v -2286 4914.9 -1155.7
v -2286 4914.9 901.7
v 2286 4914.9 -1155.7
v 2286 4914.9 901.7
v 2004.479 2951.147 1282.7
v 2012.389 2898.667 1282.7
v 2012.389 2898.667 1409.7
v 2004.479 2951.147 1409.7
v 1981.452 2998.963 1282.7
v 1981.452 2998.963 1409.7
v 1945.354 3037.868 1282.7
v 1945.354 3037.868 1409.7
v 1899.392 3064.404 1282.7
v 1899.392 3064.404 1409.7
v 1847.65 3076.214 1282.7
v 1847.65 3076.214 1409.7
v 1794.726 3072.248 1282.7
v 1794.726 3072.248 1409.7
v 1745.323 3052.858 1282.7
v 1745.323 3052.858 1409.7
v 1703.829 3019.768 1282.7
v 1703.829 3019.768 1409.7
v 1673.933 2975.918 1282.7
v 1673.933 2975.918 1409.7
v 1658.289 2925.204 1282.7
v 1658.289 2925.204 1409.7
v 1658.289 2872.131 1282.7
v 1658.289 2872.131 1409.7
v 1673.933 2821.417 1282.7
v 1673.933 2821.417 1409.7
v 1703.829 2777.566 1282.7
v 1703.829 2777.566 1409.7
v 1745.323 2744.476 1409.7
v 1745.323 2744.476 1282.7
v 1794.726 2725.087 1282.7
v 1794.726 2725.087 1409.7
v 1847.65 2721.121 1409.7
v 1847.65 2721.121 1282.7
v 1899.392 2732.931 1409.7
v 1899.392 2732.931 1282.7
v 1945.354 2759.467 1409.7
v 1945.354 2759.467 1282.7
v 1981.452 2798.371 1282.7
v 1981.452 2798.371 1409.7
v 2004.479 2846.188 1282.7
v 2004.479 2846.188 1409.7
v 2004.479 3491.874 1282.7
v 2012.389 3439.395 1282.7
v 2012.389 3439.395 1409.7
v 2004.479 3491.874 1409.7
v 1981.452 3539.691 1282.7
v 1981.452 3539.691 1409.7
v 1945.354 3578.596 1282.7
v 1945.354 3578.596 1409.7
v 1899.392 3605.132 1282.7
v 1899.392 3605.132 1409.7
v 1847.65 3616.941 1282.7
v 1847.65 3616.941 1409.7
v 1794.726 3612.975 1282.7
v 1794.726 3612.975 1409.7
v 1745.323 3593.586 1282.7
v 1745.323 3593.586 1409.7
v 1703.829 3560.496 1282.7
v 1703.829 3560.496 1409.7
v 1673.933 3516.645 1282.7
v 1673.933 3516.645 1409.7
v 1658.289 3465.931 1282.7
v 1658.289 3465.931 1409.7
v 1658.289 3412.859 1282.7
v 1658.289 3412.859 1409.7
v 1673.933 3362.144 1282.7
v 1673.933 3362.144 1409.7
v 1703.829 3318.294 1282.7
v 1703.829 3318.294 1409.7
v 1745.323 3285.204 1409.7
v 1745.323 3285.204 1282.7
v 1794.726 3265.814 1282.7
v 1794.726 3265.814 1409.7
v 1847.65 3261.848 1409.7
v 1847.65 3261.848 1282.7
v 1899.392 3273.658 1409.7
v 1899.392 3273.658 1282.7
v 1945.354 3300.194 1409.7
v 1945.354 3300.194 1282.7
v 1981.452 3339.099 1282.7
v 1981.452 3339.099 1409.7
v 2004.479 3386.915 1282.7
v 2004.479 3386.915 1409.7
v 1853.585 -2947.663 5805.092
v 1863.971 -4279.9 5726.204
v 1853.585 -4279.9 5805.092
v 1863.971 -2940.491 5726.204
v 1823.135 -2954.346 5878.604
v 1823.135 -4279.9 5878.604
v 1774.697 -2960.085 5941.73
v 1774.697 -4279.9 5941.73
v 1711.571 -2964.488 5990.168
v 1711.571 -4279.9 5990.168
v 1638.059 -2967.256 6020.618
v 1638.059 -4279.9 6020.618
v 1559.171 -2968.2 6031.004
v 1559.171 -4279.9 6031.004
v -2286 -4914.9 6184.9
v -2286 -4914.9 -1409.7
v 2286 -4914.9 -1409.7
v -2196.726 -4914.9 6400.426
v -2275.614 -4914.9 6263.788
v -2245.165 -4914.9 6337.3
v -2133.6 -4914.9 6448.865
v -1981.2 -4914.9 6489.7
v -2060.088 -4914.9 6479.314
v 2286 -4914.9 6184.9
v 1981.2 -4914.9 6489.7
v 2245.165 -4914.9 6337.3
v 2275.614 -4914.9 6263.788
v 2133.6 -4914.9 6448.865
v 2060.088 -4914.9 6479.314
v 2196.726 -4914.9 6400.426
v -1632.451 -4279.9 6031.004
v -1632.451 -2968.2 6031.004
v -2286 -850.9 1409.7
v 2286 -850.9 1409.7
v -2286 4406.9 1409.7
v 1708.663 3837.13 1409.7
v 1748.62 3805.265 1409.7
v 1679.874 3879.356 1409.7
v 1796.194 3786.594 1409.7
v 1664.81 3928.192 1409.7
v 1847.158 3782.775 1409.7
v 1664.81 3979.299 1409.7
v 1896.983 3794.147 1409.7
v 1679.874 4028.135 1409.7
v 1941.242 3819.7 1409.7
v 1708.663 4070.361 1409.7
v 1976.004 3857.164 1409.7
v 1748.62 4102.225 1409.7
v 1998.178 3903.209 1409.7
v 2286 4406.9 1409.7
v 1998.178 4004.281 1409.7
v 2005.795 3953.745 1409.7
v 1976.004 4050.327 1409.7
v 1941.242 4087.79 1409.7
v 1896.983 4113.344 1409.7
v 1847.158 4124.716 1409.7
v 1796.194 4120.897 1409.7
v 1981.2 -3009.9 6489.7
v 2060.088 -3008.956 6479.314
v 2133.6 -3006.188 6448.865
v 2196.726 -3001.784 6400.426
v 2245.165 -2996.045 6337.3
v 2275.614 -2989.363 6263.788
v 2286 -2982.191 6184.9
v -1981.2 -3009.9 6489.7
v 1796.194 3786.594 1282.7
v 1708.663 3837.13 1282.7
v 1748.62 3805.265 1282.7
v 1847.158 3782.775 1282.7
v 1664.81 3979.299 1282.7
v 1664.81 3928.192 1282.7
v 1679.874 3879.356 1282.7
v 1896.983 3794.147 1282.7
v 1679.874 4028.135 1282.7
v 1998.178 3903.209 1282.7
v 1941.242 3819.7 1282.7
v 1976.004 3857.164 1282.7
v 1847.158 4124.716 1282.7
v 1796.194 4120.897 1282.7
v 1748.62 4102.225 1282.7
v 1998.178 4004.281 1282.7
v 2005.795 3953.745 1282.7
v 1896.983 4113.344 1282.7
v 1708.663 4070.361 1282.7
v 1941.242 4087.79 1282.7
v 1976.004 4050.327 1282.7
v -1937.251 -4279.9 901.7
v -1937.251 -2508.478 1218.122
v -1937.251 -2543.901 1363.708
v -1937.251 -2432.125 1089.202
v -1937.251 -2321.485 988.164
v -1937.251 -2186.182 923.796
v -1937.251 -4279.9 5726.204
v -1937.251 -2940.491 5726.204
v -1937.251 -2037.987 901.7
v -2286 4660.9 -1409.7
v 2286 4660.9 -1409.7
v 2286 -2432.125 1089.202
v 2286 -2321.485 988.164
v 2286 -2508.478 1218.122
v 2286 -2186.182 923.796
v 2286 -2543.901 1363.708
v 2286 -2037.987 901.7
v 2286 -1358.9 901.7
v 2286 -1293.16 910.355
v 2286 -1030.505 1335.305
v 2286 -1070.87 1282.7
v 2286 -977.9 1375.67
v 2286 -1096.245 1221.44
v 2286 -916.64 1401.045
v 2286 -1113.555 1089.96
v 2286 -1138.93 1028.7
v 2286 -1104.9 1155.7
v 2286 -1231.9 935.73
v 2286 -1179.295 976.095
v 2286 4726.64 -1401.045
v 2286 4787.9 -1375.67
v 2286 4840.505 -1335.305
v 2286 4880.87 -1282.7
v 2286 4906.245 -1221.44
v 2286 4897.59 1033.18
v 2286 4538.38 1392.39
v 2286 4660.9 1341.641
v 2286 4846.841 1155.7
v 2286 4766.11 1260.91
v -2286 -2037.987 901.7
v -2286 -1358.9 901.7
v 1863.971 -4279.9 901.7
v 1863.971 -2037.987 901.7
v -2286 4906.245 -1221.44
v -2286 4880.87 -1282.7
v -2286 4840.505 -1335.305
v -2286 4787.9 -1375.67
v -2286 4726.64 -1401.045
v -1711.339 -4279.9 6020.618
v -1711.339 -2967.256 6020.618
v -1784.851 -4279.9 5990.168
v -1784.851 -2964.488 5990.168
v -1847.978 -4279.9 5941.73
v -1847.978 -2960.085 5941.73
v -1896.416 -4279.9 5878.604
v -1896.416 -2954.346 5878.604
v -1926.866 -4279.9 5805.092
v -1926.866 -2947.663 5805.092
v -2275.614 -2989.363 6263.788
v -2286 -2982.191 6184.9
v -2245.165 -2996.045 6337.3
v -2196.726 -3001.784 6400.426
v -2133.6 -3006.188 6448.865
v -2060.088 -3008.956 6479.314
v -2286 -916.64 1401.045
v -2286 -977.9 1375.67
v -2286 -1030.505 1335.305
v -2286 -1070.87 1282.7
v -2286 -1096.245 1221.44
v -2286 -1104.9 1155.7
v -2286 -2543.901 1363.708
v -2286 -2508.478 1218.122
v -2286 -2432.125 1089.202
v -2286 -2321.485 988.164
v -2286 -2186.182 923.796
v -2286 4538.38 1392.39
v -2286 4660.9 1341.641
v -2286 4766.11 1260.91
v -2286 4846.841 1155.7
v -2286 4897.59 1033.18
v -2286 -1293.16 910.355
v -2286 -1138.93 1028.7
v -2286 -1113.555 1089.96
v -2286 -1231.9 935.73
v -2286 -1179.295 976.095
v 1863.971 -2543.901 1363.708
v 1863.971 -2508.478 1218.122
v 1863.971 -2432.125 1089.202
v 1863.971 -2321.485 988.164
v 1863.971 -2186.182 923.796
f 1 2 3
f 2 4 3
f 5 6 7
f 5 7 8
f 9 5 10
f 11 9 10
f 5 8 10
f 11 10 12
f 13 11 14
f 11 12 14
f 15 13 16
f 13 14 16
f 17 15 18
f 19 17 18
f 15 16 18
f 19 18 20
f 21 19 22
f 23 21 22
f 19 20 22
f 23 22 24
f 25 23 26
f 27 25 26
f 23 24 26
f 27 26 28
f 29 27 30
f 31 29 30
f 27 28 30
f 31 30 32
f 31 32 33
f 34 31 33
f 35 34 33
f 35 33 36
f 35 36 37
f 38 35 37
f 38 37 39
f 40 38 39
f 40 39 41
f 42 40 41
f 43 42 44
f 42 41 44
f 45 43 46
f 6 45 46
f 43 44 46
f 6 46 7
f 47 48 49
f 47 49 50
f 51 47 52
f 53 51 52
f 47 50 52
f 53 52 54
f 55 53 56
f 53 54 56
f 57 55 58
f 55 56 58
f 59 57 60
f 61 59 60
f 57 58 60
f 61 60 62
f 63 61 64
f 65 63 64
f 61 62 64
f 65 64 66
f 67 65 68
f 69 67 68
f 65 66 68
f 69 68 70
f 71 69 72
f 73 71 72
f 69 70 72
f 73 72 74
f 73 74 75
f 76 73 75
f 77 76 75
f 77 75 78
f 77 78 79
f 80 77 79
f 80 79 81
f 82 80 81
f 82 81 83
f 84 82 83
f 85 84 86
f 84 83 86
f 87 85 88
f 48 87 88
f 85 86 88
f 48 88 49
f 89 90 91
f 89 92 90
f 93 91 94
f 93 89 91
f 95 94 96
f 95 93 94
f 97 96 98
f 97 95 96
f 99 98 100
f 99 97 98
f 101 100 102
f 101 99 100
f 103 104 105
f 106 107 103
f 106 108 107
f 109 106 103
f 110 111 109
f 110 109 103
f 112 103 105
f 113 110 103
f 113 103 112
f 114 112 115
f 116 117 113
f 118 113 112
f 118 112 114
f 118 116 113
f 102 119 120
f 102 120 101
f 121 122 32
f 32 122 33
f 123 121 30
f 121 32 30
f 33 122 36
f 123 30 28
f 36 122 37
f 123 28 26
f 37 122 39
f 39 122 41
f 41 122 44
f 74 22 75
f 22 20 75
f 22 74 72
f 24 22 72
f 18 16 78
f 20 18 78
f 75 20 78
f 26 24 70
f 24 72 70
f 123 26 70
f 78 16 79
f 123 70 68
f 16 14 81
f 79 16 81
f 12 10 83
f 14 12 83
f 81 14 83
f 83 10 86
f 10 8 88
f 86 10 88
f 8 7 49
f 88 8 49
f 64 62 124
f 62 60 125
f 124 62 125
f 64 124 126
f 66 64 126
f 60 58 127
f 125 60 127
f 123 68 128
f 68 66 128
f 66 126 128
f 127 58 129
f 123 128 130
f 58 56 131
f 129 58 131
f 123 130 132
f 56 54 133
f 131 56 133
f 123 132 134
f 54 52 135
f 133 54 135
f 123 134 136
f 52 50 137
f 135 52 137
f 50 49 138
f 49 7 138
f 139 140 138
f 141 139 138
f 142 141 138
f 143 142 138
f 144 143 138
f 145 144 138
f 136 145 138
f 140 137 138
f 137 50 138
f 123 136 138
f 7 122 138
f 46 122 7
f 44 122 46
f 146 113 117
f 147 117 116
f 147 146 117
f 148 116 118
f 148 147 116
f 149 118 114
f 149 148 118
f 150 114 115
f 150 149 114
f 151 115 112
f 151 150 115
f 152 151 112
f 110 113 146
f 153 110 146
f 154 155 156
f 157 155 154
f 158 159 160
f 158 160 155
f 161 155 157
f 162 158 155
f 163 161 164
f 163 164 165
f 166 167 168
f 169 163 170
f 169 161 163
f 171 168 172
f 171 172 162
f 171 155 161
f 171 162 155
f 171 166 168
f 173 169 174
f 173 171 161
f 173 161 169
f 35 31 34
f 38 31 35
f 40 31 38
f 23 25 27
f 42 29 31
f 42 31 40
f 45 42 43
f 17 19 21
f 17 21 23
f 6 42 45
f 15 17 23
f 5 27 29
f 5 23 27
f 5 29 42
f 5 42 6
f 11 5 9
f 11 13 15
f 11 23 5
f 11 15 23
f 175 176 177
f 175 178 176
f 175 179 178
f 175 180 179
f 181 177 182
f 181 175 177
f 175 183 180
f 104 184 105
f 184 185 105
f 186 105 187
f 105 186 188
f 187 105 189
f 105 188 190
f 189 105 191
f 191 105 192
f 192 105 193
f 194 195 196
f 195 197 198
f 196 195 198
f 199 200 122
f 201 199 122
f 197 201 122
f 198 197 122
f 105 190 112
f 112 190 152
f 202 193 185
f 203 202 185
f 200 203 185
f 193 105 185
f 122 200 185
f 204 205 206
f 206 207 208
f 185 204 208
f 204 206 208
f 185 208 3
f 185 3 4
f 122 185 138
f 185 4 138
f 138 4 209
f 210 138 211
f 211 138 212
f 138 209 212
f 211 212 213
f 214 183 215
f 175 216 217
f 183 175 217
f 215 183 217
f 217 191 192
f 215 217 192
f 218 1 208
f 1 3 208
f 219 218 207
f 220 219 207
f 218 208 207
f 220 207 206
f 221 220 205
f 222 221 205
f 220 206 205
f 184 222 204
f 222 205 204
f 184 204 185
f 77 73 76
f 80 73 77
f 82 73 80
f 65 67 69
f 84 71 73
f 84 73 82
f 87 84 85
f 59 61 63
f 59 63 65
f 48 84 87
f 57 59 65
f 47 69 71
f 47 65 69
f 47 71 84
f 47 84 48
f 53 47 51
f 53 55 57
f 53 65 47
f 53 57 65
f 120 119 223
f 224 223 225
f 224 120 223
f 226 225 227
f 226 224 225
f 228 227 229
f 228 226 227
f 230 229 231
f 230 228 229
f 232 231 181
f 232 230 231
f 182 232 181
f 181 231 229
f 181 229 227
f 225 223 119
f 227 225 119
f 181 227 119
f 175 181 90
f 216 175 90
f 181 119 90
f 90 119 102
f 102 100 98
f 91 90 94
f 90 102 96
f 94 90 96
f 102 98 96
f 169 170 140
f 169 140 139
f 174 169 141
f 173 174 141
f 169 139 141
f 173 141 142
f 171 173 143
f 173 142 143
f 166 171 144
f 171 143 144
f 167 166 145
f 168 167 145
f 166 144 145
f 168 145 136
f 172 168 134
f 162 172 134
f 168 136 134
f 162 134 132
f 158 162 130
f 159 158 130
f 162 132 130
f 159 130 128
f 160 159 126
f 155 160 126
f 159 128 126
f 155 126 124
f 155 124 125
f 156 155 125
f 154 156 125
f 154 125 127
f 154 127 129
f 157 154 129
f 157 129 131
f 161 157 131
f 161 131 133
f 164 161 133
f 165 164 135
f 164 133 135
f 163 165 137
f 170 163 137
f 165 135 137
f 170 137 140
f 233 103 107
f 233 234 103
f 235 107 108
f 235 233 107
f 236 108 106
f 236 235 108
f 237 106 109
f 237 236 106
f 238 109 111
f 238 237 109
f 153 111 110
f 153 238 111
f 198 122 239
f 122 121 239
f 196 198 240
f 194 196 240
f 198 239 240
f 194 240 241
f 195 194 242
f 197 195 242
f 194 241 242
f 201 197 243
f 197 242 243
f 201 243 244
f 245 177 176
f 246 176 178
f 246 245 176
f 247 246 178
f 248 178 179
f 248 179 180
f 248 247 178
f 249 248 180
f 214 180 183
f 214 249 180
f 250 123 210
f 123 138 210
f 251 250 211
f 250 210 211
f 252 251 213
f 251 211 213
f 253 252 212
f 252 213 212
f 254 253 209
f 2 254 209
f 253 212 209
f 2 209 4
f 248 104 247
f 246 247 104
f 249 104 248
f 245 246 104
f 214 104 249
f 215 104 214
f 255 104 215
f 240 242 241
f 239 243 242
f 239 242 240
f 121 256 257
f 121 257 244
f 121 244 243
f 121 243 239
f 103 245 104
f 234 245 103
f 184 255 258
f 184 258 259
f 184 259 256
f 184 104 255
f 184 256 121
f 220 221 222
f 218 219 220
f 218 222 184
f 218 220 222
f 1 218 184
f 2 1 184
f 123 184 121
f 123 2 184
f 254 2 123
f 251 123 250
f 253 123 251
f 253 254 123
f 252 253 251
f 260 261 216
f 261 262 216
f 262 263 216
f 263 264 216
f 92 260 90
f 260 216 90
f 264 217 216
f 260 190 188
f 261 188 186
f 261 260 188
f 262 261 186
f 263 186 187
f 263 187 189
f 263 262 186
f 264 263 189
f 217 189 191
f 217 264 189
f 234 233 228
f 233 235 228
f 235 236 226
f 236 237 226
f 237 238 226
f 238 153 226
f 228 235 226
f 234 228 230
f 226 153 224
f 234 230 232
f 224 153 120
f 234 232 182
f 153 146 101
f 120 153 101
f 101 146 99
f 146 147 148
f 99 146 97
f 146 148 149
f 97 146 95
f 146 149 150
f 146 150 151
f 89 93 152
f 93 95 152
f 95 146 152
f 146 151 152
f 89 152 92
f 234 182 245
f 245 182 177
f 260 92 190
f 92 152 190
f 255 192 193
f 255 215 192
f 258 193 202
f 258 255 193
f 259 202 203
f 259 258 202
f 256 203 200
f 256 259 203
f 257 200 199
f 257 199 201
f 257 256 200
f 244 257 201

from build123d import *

# Parameters (mm, degrees)
BOSS_EXTRUDE4_DEPTH = 2286
FILLET6_R           = 508
FILLET8_R           = 254
FILLET13_R          = 508
FILLET17_R          = 254
SKETCH6_R           = 171.450155781
SKETCH6_R_2         = 178.044392542
CUT_EXTRUDE6_DEPTH  = 127
BOSS_EXTRUDE5_DEPTH = 4572
SKETCH8_W           = 3801.222009046
SKETCH8_H           = 5129.303596945
CUT_EXTRUDE7_DEPTH  = 2540
SKETCH9_W           = 3801.222009046
SKETCH9_H           = 5129.303596945
BOSS_EXTRUDE6_DEPTH = 635
FILLET20_R          = 304.8
FILLET22_R          = 508


with BuildPart() as part:
    # Sketch1 → Boss-Extrude4 (new, symmetric)
    with BuildSketch(Plane(origin=(0, 0, 0), x_dir=(0, 0, -1), z_dir=(1, 0, 0))):
        Polygon((-1409.7, -4914.9), (-6489.7, -4914.9), (-6489.7, -3009.9), (-901.7, -3009.9), (-901.7, -1104.9), (-1409.7, -1104.9), (-1409.7, 4914.9), (1409.7, 4914.9), (1409.7, -4914.9), align=None)
    extrude(amount=BOSS_EXTRUDE4_DEPTH, both=True)

    # Fillet6
    fillet6_edges = [part.edges().sort_by_distance(p)[0] for p in [
        (0, 4914.9, 1409.7),
    ]]
    fillet(fillet6_edges, radius=FILLET6_R)

    # Fillet8
    fillet8_edges = [part.edges().sort_by_distance(p)[0] for p in [
        (0, 4914.9, -1409.7),
        (0, -1104.9, 1409.7),
    ]]
    fillet(fillet8_edges, radius=FILLET8_R)

    # Fillet13
    fillet13_edges = [part.edges().sort_by_distance(p)[0] for p in [
        (0, -3009.9, 901.7),
    ]]
    fillet(fillet13_edges, radius=FILLET13_R)

    # Fillet17
    fillet17_edges = [part.edges().sort_by_distance(p)[0] for p in [
        (0, -1104.9, 901.7),
    ]]
    fillet(fillet17_edges, radius=FILLET17_R - 0.0001)  # a hair under: the kernel refuses the full size

    # Sketch6 → Cut-Extrude6 (cut)
    with BuildSketch(Plane.XY.offset(1409.7)):
        with Locations((1834.345031139, 3953.745263641)):
            Circle(SKETCH6_R)
        with Locations((1834.345031139, 3439.394796298)):
            Circle(SKETCH6_R_2)
        with Locations((1834.345031139, 2898.667381912)):
            Circle(SKETCH6_R_2)
    extrude(amount=-CUT_EXTRUDE6_DEPTH, mode=Mode.SUBTRACT)

    # Sketch7 → Boss-Extrude5 (add)
    with BuildSketch(Plane(origin=(2286, 0, 0), x_dir=(0, 0, -1), z_dir=(1, 0, 0))):
        Polygon((-6489.7, -3009.9), (-901.7, -2501.9), (-901.7, -3009.9), align=None)
    extrude(amount=-BOSS_EXTRUDE5_DEPTH)

    # Sketch8 → Cut-Extrude7 (cut)
    with BuildSketch(Plane.XZ.offset(4914.9)):
        with Locations((-36.640426205, 3466.351798472)):
            Rectangle(SKETCH8_W, SKETCH8_H)
    extrude(amount=-CUT_EXTRUDE7_DEPTH, mode=Mode.SUBTRACT)

    # Sketch9 → Boss-Extrude6 (add)
    with BuildSketch(Plane.XZ.offset(4914.9)):
        with Locations((-36.640426205, 3466.351798472)):
            Rectangle(SKETCH9_W, SKETCH9_H)
    extrude(amount=-BOSS_EXTRUDE6_DEPTH)

    # Fillet20
    fillet20_edges = [part.edges().sort_by_distance(p)[0] for p in [
        (-2286, -3962.4, 6489.7),
        (2286, -3962.4, 6489.7),
        (-1937.251430728, -3624.050163498, 6031.003596945),
        (1863.970578318, -3624.050163498, 6031.003596945),
    ]]
    fillet(fillet20_edges, radius=FILLET20_R)

    # Fillet22
    fillet22_edges = [part.edges().sort_by_distance(p)[0] for p in [
        (-2111.625715364, -2501.9, 901.7),
        (2074.985289159, -2501.9, 901.7),
    ]]
    fillet(fillet22_edges, radius=FILLET22_R)


solid = part.part
